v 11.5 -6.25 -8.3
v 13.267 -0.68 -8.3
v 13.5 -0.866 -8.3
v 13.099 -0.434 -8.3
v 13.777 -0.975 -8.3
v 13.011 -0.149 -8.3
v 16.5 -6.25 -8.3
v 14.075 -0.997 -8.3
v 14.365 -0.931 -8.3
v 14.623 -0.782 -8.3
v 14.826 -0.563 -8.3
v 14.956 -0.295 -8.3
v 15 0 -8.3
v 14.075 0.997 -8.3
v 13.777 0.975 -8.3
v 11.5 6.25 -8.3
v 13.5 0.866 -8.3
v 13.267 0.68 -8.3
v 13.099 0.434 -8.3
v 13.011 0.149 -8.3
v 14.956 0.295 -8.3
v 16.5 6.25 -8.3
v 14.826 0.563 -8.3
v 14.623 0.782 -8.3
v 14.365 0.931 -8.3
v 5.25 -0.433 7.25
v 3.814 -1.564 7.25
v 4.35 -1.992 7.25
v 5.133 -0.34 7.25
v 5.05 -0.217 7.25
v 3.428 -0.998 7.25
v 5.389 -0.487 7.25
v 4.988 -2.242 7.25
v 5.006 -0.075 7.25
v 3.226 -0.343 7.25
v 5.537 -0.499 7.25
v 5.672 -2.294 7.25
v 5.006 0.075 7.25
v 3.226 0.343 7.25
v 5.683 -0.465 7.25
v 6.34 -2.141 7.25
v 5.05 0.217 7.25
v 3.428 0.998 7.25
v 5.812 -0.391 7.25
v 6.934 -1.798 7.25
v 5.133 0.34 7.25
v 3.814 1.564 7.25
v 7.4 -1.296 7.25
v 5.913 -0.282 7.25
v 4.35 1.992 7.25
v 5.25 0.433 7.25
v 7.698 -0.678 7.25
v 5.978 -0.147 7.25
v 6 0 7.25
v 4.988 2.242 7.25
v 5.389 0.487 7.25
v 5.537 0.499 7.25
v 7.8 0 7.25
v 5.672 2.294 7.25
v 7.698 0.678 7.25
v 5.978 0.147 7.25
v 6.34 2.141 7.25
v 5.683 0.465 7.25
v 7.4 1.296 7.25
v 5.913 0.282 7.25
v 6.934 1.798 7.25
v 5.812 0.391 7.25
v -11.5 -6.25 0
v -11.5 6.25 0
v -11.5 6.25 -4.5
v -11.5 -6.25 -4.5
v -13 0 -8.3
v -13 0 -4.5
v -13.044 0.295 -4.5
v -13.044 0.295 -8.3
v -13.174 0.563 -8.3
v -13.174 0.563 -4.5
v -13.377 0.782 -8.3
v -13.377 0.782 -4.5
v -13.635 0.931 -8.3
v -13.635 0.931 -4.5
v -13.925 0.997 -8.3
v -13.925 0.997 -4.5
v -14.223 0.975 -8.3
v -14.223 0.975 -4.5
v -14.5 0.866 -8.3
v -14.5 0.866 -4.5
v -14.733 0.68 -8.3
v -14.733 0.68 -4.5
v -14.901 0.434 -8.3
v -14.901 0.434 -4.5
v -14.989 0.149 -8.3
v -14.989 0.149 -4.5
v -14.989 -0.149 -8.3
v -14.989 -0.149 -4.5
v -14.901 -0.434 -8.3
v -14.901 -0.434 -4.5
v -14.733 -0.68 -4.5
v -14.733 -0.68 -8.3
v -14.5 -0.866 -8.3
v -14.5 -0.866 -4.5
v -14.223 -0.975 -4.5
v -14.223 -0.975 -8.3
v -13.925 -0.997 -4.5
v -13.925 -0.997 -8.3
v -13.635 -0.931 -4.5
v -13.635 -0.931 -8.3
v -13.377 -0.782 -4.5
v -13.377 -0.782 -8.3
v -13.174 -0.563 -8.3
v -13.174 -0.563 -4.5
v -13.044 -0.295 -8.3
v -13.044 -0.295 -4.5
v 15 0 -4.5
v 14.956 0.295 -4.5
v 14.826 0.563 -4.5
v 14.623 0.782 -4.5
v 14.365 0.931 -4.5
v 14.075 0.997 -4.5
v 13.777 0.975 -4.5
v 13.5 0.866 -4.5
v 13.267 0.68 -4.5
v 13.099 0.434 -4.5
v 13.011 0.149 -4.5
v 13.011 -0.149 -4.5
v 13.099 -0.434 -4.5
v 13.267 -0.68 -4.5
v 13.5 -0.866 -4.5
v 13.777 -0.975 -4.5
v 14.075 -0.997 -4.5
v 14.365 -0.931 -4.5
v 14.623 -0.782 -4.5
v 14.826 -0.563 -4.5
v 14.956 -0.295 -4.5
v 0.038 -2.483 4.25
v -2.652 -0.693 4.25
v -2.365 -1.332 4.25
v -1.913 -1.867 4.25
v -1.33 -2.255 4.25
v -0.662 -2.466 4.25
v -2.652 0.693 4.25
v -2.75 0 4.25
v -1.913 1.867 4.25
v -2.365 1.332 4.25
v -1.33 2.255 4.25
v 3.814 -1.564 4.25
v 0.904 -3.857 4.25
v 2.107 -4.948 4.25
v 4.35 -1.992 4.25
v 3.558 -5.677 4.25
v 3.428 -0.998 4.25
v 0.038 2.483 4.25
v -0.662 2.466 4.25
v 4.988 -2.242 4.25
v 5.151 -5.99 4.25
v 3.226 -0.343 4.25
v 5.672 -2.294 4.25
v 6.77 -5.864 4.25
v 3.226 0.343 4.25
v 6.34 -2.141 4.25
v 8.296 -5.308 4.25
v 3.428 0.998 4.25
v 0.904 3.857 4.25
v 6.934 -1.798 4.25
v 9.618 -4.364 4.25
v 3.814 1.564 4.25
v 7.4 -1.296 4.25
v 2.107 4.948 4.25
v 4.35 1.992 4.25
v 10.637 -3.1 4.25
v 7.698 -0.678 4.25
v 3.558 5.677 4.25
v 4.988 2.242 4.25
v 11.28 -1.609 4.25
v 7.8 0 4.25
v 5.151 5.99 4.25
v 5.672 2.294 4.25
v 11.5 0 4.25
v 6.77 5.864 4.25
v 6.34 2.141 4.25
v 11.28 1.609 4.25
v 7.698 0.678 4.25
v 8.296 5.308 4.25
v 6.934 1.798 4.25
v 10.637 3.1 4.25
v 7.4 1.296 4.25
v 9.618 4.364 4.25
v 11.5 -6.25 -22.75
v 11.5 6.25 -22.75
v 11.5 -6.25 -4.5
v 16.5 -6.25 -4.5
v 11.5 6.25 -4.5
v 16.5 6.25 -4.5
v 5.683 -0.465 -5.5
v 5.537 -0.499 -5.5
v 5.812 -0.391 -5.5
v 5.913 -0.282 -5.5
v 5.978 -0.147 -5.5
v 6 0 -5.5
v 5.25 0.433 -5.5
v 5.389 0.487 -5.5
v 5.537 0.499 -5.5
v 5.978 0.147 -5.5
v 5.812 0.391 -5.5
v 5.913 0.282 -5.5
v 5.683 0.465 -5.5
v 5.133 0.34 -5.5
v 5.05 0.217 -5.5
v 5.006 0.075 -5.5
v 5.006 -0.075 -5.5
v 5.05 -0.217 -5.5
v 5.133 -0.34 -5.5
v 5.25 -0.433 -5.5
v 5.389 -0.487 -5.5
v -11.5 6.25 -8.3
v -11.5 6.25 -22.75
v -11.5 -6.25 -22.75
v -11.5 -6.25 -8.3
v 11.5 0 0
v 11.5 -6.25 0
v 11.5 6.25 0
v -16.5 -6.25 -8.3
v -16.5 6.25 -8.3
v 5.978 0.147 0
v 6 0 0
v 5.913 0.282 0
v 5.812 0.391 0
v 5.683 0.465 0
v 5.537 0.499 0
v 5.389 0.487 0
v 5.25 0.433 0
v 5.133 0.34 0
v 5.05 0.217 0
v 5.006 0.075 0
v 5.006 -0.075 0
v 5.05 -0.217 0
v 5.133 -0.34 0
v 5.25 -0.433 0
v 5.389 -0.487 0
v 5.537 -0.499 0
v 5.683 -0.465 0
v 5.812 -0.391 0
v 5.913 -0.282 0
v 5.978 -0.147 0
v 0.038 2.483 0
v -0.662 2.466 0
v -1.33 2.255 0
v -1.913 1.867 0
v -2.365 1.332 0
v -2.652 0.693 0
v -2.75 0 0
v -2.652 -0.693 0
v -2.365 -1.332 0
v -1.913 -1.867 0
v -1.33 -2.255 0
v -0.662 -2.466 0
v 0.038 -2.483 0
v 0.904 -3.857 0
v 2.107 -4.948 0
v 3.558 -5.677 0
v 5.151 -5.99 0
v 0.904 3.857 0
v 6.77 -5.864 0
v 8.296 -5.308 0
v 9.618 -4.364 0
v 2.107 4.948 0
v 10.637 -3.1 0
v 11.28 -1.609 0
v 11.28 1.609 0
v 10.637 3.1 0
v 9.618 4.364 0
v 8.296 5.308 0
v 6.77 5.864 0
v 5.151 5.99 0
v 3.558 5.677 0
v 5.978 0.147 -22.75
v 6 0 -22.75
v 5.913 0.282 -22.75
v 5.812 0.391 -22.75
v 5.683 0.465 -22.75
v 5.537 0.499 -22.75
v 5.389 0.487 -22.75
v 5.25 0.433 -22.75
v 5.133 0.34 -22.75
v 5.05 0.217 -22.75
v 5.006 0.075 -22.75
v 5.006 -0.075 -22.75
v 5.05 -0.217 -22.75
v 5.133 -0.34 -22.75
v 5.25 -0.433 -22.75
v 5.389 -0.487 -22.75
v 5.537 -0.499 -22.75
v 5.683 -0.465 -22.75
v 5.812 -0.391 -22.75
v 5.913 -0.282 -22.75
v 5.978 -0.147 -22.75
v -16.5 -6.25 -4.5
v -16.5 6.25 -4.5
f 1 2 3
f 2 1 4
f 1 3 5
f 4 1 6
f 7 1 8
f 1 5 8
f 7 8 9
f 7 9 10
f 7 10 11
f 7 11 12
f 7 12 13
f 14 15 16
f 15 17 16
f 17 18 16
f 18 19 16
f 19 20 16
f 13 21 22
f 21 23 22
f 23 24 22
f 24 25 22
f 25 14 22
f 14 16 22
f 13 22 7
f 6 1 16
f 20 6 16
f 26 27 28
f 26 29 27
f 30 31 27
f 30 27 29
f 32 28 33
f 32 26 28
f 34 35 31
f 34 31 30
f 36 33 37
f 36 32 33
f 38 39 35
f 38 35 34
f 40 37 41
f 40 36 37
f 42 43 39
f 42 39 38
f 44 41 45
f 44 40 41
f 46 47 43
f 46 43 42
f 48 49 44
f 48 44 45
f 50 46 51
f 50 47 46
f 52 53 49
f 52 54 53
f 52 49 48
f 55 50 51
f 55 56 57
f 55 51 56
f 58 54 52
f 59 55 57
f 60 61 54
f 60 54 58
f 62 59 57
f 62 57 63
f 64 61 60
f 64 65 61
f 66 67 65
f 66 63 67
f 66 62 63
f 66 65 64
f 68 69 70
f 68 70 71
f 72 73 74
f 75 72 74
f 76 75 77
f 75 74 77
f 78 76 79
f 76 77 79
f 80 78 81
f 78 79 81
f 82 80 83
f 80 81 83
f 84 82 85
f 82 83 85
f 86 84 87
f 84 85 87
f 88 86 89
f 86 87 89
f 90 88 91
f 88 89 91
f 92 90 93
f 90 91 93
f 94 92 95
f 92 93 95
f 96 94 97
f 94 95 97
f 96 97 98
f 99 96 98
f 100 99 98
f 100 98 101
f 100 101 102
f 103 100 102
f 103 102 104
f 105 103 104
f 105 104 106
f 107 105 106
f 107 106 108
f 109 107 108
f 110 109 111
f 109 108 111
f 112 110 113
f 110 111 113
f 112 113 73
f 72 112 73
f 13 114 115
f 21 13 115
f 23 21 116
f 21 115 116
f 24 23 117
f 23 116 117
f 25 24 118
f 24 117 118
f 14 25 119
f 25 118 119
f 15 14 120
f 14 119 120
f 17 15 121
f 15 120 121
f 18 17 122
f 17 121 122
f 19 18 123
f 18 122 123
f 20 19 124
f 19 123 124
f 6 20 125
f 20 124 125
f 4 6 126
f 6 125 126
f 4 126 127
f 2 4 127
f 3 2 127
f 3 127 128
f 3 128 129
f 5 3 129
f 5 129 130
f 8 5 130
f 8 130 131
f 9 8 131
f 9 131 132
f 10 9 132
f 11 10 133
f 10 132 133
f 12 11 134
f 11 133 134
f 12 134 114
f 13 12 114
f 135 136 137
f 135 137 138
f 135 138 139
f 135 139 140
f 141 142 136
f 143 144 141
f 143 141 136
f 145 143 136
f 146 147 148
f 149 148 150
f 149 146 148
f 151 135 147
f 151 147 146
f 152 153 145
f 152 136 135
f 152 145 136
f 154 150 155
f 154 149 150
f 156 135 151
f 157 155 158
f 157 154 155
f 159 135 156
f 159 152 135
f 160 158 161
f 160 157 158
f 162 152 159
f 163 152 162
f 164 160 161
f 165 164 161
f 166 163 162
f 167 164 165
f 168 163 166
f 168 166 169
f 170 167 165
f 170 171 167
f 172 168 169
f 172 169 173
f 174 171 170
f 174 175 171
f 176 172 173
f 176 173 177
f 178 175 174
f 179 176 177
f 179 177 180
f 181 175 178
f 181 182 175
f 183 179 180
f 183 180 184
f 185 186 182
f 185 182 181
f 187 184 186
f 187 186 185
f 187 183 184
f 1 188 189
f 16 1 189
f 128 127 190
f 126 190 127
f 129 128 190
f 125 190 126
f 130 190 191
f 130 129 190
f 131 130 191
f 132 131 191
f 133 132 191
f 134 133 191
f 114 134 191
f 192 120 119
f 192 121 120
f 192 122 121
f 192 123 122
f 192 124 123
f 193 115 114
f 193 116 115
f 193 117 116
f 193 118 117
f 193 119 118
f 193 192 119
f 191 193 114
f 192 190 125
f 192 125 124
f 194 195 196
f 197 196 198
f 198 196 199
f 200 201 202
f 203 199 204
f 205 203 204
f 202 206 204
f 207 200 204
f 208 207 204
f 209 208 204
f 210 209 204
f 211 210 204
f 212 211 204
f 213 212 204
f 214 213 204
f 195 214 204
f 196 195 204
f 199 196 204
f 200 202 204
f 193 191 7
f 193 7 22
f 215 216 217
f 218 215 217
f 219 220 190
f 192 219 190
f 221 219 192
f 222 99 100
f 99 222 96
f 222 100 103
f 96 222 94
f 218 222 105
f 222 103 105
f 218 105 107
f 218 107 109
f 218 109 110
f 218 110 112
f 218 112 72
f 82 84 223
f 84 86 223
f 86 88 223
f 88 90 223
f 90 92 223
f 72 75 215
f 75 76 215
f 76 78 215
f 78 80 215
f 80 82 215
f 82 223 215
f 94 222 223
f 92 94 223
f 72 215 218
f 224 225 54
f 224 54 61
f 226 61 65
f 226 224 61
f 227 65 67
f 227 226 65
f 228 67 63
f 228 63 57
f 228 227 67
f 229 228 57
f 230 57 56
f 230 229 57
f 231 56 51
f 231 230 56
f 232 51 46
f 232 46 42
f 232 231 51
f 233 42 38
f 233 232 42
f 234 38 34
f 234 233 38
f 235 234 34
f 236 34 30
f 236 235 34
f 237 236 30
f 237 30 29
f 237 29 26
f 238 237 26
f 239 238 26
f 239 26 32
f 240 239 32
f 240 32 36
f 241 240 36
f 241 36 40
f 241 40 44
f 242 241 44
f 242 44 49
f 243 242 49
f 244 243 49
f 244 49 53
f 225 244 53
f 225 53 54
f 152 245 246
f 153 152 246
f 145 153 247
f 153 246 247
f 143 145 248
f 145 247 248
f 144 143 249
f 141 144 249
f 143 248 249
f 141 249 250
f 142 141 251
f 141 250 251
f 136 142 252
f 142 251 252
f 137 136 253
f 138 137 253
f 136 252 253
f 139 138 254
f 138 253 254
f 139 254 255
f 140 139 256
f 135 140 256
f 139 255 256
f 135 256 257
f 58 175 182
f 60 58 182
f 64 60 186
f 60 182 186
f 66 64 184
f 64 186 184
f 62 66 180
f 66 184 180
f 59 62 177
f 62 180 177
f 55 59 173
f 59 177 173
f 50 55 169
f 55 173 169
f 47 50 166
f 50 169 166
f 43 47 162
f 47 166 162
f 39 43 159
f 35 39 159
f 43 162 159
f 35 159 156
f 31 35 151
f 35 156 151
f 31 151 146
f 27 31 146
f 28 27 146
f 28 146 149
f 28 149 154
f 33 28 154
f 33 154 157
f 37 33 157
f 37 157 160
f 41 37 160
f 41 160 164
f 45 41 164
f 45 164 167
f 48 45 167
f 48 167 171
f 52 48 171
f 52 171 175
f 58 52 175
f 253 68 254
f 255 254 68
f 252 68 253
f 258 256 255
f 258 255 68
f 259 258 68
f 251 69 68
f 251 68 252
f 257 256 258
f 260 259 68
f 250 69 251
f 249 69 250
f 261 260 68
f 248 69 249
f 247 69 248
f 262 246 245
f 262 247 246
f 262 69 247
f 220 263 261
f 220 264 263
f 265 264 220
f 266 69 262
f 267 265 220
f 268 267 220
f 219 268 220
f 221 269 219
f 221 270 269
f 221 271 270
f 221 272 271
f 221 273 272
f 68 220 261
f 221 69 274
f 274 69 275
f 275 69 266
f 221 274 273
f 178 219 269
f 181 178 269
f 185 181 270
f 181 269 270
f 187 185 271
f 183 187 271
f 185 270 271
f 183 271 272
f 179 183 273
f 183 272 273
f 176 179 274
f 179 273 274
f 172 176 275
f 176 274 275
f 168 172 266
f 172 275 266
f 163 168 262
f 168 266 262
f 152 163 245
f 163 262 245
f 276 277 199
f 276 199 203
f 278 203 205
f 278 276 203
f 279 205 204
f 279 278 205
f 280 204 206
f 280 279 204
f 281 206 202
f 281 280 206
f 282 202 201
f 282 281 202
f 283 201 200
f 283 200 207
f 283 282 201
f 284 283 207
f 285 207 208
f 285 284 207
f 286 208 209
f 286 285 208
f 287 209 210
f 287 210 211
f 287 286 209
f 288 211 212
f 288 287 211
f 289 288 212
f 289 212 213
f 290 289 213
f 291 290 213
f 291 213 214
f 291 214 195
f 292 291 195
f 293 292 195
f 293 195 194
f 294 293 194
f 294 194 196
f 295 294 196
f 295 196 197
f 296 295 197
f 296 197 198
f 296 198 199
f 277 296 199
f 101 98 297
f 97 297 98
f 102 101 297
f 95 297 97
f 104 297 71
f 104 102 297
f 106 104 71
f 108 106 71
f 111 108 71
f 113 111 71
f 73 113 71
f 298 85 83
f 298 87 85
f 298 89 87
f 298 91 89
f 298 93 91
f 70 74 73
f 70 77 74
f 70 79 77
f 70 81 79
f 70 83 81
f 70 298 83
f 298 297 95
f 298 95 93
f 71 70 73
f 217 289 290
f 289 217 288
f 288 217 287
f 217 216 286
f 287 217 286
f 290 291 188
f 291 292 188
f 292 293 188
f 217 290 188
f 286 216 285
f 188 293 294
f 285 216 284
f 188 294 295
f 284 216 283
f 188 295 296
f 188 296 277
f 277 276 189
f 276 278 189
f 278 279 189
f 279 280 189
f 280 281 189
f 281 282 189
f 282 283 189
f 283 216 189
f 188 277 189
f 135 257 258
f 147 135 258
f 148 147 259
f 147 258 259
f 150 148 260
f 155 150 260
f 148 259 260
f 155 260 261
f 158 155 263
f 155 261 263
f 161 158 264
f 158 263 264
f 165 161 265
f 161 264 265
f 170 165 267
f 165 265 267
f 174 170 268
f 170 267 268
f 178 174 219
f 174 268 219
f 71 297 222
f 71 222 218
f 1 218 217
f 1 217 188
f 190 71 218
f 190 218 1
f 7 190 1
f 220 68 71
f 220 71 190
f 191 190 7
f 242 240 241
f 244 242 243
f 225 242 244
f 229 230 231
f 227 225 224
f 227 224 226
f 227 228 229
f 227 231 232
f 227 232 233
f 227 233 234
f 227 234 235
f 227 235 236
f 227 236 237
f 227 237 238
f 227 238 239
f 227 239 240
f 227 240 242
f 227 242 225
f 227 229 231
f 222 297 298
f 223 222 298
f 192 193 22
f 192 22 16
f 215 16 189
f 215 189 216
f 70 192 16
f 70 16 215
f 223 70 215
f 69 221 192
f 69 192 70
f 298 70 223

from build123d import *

# Parameters (mm, degrees)
F0_R     = 2.3
F0_R_2   = 0.5
F1_DEPTH = 22.75
F2_DEPTH = 4.25
F3_DEPTH = 7.25
F4_START = -4.5
F0_R_3   = 1
F4_DEPTH = 3.8
F5_START = -4.5
F0_W     = 5
F0_H     = 12.5
F5_DEPTH = 3.8
F6_DEPTH = 5.5


with BuildPart() as f1:
    # F0 (on Top) → F1 (new body)
    with BuildSketch(Plane.XY):
        Polygon((-11.5, -6.25), (11.5, -6.25), (11.5, 0), (11.5, 6.25), (-11.5, 6.25), align=None)
        with BuildLine():
            ThreePointArc((0.0380434783, 2.4833507514), (6.7704843308, 5.8639465861), (11.5, 0))
            ThreePointArc((11.5, 0), (6.7704843308, -5.8639465861), (0.0380434783, -2.4833507514))
            ThreePointArc((0.0380434783, -2.4833507514), (-2.75, 0), (0.0380434783, 2.4833507514))
        make_face(mode=Mode.SUBTRACT)
        with BuildLine():
            ThreePointArc((0.0380434783, -2.4833507514), (-0.5, 0), (0.0380434783, 2.4833507514))
            ThreePointArc((0.0380434783, 2.4833507514), (-2.75, 0), (0.0380434783, -2.4833507514))
        make_face()
        with BuildLine():
            ThreePointArc((2.25, 0), (1.6168300265, 1.6628125728), (0.0380434783, 2.4833507514))
            ThreePointArc((0.0380434783, 2.4833507514), (-0.5, 0), (0.0380434783, -2.4833507514))
            ThreePointArc((0.0380434783, -2.4833507514), (1.6168300265, -1.6628125728), (2.25, 0))
        make_face()
        with BuildLine():
            ThreePointArc((0.0380434783, -2.4833507514), (6.7704843308, -5.8639465861), (11.5, 0))
            ThreePointArc((11.5, 0), (6.7704843308, 5.8639465861), (0.0380434783, 2.4833507514))
            ThreePointArc((0.0380434783, 2.4833507514), (1.6168300265, 1.6628125728), (2.25, 0))
            ThreePointArc((2.25, 0), (1.6168300265, -1.6628125728), (0.0380434783, -2.4833507514))
        make_face()
        with Locations((5.5, 0)):
            Circle(F0_R, mode=Mode.SUBTRACT)
        with Locations((5.5, 0)):
            Circle(F0_R)
        with Locations((5.5, 0)):
            Circle(F0_R_2, mode=Mode.SUBTRACT)
    extrude(amount=-F1_DEPTH)

    # F0 (on Top) → F2 (join)
    with BuildSketch(Plane.XY):
        with BuildLine():
            ThreePointArc((0.0380434783, -2.4833507514), (6.7704843308, -5.8639465861), (11.5, 0))
            ThreePointArc((11.5, 0), (6.7704843308, 5.8639465861), (0.0380434783, 2.4833507514))
            ThreePointArc((0.0380434783, 2.4833507514), (1.6168300265, 1.6628125728), (2.25, 0))
            ThreePointArc((2.25, 0), (1.6168300265, -1.6628125728), (0.0380434783, -2.4833507514))
        make_face()
        with Locations((5.5, 0)):
            Circle(F0_R, mode=Mode.SUBTRACT)
        with Locations((5.5, 0)):
            Circle(F0_R)
        with Locations((5.5, 0)):
            Circle(F0_R_2, mode=Mode.SUBTRACT)
        with BuildLine():
            ThreePointArc((2.25, 0), (1.6168300265, 1.6628125728), (0.0380434783, 2.4833507514))
            ThreePointArc((0.0380434783, 2.4833507514), (-0.5, 0), (0.0380434783, -2.4833507514))
            ThreePointArc((0.0380434783, -2.4833507514), (1.6168300265, -1.6628125728), (2.25, 0))
        make_face()
        with BuildLine():
            ThreePointArc((0.0380434783, -2.4833507514), (-0.5, 0), (0.0380434783, 2.4833507514))
            ThreePointArc((0.0380434783, 2.4833507514), (-2.75, 0), (0.0380434783, -2.4833507514))
        make_face()
    extrude(amount=F2_DEPTH)

    # F0 (on Top) → F3 (join)
    with BuildSketch(Plane.XY):
        with Locations((5.5, 0)):
            Circle(F0_R)
        with Locations((5.5, 0)):
            Circle(F0_R_2, mode=Mode.SUBTRACT)
    extrude(amount=F3_DEPTH)

    # F0 (on Top) → F4 (join)
    with BuildSketch(Plane.XY.offset(F4_START)):
        Polygon((11.5, 0), (11.5, -6.25), (16.5, -6.25), (16.5, 6.25), (11.5, 6.25), align=None)
        with Locations((14, 0)):
            Circle(F0_R_3, mode=Mode.SUBTRACT)
    extrude(amount=-F4_DEPTH)

    # F0 (on Top) → F5 (join)
    with BuildSketch(Plane.XY.offset(F5_START)):
        with Locations((-14, 0)):
            Rectangle(F0_W, F0_H)
        with Locations((-14, 0)):
            Circle(F0_R_3, mode=Mode.SUBTRACT)
    extrude(amount=-F5_DEPTH)

    # F0 (on Top) → F6 (join)
    with BuildSketch(Plane.XY):
        with Locations((5.5, 0)):
            Circle(F0_R_2)
    extrude(amount=-F6_DEPTH)


solid = f1.part
